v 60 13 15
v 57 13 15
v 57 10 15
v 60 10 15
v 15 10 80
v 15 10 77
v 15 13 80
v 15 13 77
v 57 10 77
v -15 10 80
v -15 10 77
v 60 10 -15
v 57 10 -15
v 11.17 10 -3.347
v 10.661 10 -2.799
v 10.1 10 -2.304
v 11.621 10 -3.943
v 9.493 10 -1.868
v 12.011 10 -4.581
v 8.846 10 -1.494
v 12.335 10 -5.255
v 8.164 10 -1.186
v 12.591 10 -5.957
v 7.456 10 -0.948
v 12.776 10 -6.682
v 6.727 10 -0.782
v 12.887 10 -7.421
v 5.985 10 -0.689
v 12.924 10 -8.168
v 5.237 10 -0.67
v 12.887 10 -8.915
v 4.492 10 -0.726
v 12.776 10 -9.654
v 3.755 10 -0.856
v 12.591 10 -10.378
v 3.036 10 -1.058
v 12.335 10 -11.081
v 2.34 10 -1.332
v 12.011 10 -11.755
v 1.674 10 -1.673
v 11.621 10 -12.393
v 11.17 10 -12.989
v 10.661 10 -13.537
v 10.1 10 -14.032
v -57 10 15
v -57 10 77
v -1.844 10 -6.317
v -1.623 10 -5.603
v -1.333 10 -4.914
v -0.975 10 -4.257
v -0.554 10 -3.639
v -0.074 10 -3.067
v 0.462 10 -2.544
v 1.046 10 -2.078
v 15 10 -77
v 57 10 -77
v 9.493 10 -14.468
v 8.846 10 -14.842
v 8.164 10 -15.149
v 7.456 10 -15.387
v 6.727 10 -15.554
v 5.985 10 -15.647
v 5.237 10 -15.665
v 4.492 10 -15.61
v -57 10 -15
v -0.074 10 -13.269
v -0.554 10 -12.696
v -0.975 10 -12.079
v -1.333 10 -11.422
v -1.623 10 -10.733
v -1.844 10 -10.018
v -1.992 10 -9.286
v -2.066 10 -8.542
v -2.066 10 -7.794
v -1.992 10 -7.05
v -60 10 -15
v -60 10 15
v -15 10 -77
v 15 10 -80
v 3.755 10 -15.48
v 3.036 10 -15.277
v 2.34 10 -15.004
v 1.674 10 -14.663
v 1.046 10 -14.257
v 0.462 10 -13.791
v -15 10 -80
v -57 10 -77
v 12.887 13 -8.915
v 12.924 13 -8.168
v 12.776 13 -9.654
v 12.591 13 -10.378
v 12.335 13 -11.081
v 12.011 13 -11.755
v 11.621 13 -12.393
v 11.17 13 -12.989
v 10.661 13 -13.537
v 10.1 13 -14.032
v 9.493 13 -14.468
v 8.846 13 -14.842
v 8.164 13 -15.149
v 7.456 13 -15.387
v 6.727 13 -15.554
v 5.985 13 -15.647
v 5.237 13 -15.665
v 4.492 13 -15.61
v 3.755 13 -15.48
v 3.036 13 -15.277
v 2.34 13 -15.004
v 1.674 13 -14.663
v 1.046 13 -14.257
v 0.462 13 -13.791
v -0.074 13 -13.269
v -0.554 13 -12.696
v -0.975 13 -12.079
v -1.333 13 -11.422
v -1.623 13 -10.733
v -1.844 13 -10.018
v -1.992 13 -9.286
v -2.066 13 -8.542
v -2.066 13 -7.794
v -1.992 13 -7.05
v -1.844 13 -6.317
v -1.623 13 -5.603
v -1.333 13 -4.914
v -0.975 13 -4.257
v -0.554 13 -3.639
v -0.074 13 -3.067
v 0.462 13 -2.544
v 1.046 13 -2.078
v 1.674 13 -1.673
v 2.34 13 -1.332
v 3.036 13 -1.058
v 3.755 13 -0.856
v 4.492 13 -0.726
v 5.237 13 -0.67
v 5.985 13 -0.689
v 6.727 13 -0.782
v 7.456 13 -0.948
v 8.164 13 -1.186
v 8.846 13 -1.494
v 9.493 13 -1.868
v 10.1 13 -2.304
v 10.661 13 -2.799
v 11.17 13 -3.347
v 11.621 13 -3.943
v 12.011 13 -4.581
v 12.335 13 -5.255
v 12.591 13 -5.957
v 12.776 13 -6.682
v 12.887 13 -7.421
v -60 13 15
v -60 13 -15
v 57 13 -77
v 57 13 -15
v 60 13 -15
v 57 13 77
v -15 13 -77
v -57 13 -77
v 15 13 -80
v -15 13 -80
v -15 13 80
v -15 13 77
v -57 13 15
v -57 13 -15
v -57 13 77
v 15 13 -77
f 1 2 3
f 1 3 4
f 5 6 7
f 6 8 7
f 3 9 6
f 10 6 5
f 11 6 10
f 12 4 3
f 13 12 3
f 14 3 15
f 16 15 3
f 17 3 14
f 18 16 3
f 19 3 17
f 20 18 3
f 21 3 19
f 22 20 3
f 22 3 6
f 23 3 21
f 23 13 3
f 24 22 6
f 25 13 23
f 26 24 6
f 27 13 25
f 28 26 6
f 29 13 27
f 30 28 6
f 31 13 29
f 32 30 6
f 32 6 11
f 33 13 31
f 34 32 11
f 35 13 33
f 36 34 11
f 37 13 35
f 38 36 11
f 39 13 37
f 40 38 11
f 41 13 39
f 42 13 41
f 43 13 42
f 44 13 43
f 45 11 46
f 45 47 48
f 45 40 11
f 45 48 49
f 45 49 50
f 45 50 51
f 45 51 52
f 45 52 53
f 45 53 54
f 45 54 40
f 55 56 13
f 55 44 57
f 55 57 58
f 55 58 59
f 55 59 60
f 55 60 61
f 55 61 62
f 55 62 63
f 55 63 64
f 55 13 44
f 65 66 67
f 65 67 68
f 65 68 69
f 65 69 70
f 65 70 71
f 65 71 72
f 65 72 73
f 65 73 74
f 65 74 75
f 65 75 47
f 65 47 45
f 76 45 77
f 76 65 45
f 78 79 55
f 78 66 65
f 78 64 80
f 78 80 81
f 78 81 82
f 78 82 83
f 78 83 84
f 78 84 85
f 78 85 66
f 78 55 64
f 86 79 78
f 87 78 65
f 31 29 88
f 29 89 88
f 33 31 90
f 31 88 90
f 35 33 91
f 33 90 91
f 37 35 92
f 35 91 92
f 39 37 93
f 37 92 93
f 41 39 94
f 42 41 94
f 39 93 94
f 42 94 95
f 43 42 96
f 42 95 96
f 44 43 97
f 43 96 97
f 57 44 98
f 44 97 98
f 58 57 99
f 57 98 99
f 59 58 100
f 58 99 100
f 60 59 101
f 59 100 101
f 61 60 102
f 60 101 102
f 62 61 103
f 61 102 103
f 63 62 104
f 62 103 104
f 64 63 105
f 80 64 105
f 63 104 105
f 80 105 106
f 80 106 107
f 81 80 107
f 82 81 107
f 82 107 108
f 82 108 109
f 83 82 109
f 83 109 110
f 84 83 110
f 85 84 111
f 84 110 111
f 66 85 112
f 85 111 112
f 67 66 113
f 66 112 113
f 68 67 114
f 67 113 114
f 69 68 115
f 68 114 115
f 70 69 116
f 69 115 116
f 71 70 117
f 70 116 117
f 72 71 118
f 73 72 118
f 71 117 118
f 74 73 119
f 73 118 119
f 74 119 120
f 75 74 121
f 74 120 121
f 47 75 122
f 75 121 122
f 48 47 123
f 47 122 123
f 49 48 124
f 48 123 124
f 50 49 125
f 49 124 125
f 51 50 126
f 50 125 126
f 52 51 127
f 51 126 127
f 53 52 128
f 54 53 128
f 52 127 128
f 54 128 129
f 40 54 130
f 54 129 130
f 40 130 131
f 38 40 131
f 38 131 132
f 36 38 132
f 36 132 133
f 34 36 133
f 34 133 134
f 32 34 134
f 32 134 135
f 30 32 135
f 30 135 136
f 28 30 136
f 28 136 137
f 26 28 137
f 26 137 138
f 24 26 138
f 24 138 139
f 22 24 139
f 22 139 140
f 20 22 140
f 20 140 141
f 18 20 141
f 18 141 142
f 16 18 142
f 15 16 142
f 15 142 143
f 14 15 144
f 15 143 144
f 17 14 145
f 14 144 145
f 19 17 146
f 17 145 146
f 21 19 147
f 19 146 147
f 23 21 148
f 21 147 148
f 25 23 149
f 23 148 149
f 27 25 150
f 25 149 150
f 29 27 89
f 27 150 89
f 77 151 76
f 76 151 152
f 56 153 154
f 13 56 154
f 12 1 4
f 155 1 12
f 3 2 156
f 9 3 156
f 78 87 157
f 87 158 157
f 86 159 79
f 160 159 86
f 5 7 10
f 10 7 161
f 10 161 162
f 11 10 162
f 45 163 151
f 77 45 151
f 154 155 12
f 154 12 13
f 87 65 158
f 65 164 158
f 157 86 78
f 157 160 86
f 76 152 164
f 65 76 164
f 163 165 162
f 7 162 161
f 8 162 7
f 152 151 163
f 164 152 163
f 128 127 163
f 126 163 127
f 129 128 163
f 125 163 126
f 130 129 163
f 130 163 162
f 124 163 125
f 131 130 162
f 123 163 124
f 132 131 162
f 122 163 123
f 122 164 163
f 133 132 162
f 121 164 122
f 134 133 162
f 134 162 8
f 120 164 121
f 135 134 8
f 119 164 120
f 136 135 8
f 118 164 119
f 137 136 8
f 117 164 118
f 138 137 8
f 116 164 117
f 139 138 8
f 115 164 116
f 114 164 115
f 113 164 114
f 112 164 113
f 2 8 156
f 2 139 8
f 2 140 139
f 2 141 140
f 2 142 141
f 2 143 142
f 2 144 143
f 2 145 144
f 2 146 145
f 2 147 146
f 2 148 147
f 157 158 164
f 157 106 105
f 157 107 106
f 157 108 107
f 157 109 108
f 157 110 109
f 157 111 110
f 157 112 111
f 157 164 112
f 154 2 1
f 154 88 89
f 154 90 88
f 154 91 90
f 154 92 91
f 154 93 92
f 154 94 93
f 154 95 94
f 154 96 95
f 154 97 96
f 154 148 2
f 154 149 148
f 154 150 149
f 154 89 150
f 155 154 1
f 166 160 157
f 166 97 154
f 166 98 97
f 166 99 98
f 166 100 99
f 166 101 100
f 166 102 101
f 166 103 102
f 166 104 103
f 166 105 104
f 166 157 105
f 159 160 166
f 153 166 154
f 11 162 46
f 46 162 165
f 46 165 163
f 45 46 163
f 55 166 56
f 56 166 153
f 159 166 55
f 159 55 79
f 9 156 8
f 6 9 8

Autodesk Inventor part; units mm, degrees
ref_plane "YZ Plane" through (0, 0, 0) normal (1, 0, 0) x (0, 1, 0)
ref_plane "XZ Plane" through (0, 0, 0) normal (0, 1, 0) x (-1, 0, 0)
ref_plane "XY Plane" through (0, 0, 0) normal (0, 0, 1) x (1, 0, 0)
sketch "스케치1" plane through (0, 0, 0) normal (0, 1, 0) x (-1, 0, 0)
  line L0 (60, 80) -> (-60, 80)
  line L1 (-60, 80) -> (-60, -80)
  line L2 (-60, -80) -> (60, -80)
  line L3 (60, -80) -> (60, 80)
  line L4 (60, 80) -> (-60, -80) construction
  line L5 (-60, 80) -> (60, -80) construction
  point P0 (0, 0)
  dimension "d0" = 120
  dimension "d1" = 160
extrude "돌출1" add sketch "스케치1" along normal blind 60
sketch "스케치2" plane through (0, 60, 0) normal (0, 1, 0) x (1, 0, 0)
  line L0 (60, -80) -> (60, 80) projected
  line L1 (60, 80) -> (-60, 80) projected
  line L2 (55, 102.1646) -> (-55, 102.1646)
  line L3 (-55, 102.1646) -> (-55, -89.711)
  line L4 (-55, -89.711) -> (55, -89.711)
  line L5 (55, -89.711) -> (55, 102.1646)
  line L6 (-60, 80) -> (-60, -80) projected
  point P0 (0, 0)
  point P1 (55, 80)
  point P2 (-55, 80)
  dimension "d6" = 5
  dimension "d7" = 5
extrude "돌출2" cut sketch "스케치2" against normal blind 40 contours L5 L4 L3 L1
sketch "스케치12" plane through (60, 0, -80) normal (0, 0, -1) x (-1, 0, 0)
  line L0 (-34.8463, 10) -> (156.2634, 10)
  line L1 (156.2634, 10) -> (156.2634, -36.9465)
  line L2 (156.2634, -36.9465) -> (-34.8463, -36.9465)
  line L3 (-34.8463, -36.9465) -> (-34.8463, 10)
  line L4 (0, 0) -> (120, 0) projected
  point P0 (60, 0)
  dimension "d85" = 10
extrude "돌출10" cut sketch "스케치12" against normal through all
sketch "스케치13" plane through (-55, 20, 80) normal (0, 0, 1) x (1, 0, 0)
  line L0 (0, 40) -> (0, 0) projected
  line L1 (0, 0) -> (110, 0) projected
  line L2 (0, 40) -> (110, 40)
  line L3 (110, 40) -> (110, 0)
  line L4 (110, 0) -> (0, 0)
  line L5 (0, 0) -> (0, 40)
  point P0 (55, -20)
extrude "돌출11" add sketch "스케치13" against normal blind 5
sketch "스케치14" plane through (55, 20, -80) normal (0, 0, -1) x (-1, 0, 0)
  line L0 (0, 0) -> (0, 40) projected
  line L1 (110, 0) -> (0, 0) projected
  line L2 (0, 40) -> (110, 40)
  line L3 (110, 40) -> (110, 0)
  line L4 (110, 0) -> (0, 0)
  line L5 (0, 0) -> (0, 40)
  point P0 (55, -20)
extrude "돌출12" add sketch "스케치14" against normal blind 5
sketch "스케치15" plane through (60, 60, -80) normal (0, 0, -1) x (-1, 0, 0)
  point P0 (60, -60)
sketch "스케치16" plane through (60, 60, -80) normal (0, 0, -1) x (-1, 0, 0)
  point P0 (60, -60)
sketch "스케치21" plane through (0, 20, 0) normal (0, 1, 0) x (1, 0, 0)
  circle A0 centre (5.4243, 8.1678) radius 7.5
  line L0 (-49.3888, 17.2731) -> (-9.3888, 17.2731)
  line L1 (-9.3888, 17.2731) -> (-9.3888, 67.2731)
  line L2 (-9.3888, 67.2731) -> (-49.3888, 67.2731)
  line L3 (-49.3888, 67.2731) -> (-49.3888, 17.2731)
  point P0 (0, 0)
  dimension "d117" = 15
  dimension "d118" = 50
  dimension "d119" = 40
extrude "돌출15" cut sketch "스케치21" against normal through all contours A0
sketch "스케치24" plane through (0, 60, 0) normal (0, 1, 0) x (1, 0, 0)
  line L0 (-60, 80) -> (-60, -80) projected
  line L1 (60, 80) -> (-60, 80) projected
  line L2 (-60, -80) -> (60, -80)
  line L3 (60, -80) -> (60, 80)
  line L4 (60, 80) -> (-60, 80)
  line L5 (-60, 80) -> (-60, -80)
  point P0 (0, 0)
extrude "돌출17" cut sketch "스케치24" against normal blind 40
sketch "스케치25" plane through (60, 20, -80) normal (0, 0, -1) x (-1, 0, 0)
  point P0 (60, -20)
sketch "스케치26" plane through (0, 20, 0) normal (0, 1, 0) x (1, 0, 0)
  point P0 (0, 0)
sketch "스케치27" plane through (0, 20, 0) normal (0, 1, 0) x (1, 0, 0)
  line L0 (-60, -80) -> (-60, 80) projected
  line L1 (60, 80) -> (60, -80) projected
  line L2 (-60, -80) -> (60, -80)
  line L3 (60, -80) -> (60, 80)
  line L4 (60, 80) -> (-60, 80)
  line L5 (-60, 80) -> (-60, -80)
  point P0 (0, 0)
  point P1 (60, -80)
extrude "돌출18" cut sketch "스케치27" against normal blind 7
sketch "스케치30" plane through (0, 13, 0) normal (0, 1, 0) x (1, 0, 0)
  point P0 (0, 0)
sketch "스케치31" plane through (0, 13, 0) normal (0, 1, 0) x (1, 0, 0)
  line L0 (-60, -80) -> (-60, 80) projected
  line L1 (60, -80) -> (-60, -80) projected
  line L2 (60, 80) -> (60, -80) projected
  line L3 (-60, 80) -> (60, 80) projected
  line L4 (57, 77) -> (57, -77)
  line L5 (57, -77) -> (-57, -77)
  line L6 (-57, -77) -> (-57, 77)
  line L7 (-57, 77) -> (57, 77)
  point P0 (0, 0)
  dimension "d160" = 3
extrude "돌출21" cut sketch "스케치31" against normal through all
sketch "스케치32" plane through (0, 13, 0) normal (0, 1, 0) x (1, 0, 0)
  line L0 (-15, 68.5163) -> (15, 68.5163)
  line L1 (15, 68.5163) -> (15, 80)
  line L2 (15, 80) -> (-15, 80)
  line L3 (-15, 80) -> (-15, 68.5163)
  line L4 (57, 77) -> (-57, 77) projected
  line L5 (-57, 77) -> (-57, -77) projected
  line L6 (-57, 0) -> (57, 0)
  line L7 (-15, -68.5163) -> (15, -68.5163)
  line L8 (15, -68.5163) -> (15, -80)
  line L9 (15, -80) -> (-15, -80)
  line L10 (-15, -80) -> (-15, -68.5163)
  line L11 (-57, -77) -> (57, -77) projected
  point P0 (0, 0)
  point P1 (-15, 77)
  point P2 (15, 77)
  point P3 (15, -77)
  point P4 (-15, -77)
  dimension "d163" = 3
  dimension "d164" = 42
  dimension "d165" = 30
extrude "돌출22" add sketch "스케치32" against normal blind 3 contours L11 L8 L9 L10 | L3 L2 L1 L4
sketch "스케치33" plane through (0, 13, 0) normal (0, 1, 0) x (1, 0, 0)
  line L0 (44.1532, -15) -> (60, -15)
  line L1 (60, -15) -> (60, 15)
  line L2 (60, 15) -> (44.1532, 15)
  line L3 (44.1532, 15) -> (44.1532, -15)
  line L4 (57, -77) -> (57, 77) projected
  line L5 (57, 77) -> (15, 77) projected
  line L6 (-57, 77) -> (-57, -77) projected
  line L7 (-15, 80) -> (15, 80) projected
  line L8 (0, 80) -> (0, -80)
  line L9 (15, -80) -> (-15, -80) projected
  line L10 (-44.1532, -15) -> (-60, -15)
  line L11 (-60, -15) -> (-60, 15)
  line L12 (-60, 15) -> (-44.1532, 15)
  line L13 (-44.1532, 15) -> (-44.1532, -15)
  point P0 (0, 0)
  point P1 (57, 15)
  point P2 (57, -15)
  point P3 (-57, -15)
  point P4 (-57, 15)
  dimension "d168" = 3
  dimension "d169" = 30
  dimension "d170" = 62
extrude "돌출23" add sketch "스케치33" against normal blind 3 contours L4 L2 L1 L0 | L6 L10 L11 L12
sketch "스케치34" plane through (0, 13, 0) normal (0, 1, 0) x (1, 0, 0)
  point P0 (0, 0)
sketch "스케치35" plane through (0, 13, 0) normal (0, 1, 0) x (1, 0, 0)
  point P0 (0, 0)
properties part number "본체 밑판 레이저 커터"
